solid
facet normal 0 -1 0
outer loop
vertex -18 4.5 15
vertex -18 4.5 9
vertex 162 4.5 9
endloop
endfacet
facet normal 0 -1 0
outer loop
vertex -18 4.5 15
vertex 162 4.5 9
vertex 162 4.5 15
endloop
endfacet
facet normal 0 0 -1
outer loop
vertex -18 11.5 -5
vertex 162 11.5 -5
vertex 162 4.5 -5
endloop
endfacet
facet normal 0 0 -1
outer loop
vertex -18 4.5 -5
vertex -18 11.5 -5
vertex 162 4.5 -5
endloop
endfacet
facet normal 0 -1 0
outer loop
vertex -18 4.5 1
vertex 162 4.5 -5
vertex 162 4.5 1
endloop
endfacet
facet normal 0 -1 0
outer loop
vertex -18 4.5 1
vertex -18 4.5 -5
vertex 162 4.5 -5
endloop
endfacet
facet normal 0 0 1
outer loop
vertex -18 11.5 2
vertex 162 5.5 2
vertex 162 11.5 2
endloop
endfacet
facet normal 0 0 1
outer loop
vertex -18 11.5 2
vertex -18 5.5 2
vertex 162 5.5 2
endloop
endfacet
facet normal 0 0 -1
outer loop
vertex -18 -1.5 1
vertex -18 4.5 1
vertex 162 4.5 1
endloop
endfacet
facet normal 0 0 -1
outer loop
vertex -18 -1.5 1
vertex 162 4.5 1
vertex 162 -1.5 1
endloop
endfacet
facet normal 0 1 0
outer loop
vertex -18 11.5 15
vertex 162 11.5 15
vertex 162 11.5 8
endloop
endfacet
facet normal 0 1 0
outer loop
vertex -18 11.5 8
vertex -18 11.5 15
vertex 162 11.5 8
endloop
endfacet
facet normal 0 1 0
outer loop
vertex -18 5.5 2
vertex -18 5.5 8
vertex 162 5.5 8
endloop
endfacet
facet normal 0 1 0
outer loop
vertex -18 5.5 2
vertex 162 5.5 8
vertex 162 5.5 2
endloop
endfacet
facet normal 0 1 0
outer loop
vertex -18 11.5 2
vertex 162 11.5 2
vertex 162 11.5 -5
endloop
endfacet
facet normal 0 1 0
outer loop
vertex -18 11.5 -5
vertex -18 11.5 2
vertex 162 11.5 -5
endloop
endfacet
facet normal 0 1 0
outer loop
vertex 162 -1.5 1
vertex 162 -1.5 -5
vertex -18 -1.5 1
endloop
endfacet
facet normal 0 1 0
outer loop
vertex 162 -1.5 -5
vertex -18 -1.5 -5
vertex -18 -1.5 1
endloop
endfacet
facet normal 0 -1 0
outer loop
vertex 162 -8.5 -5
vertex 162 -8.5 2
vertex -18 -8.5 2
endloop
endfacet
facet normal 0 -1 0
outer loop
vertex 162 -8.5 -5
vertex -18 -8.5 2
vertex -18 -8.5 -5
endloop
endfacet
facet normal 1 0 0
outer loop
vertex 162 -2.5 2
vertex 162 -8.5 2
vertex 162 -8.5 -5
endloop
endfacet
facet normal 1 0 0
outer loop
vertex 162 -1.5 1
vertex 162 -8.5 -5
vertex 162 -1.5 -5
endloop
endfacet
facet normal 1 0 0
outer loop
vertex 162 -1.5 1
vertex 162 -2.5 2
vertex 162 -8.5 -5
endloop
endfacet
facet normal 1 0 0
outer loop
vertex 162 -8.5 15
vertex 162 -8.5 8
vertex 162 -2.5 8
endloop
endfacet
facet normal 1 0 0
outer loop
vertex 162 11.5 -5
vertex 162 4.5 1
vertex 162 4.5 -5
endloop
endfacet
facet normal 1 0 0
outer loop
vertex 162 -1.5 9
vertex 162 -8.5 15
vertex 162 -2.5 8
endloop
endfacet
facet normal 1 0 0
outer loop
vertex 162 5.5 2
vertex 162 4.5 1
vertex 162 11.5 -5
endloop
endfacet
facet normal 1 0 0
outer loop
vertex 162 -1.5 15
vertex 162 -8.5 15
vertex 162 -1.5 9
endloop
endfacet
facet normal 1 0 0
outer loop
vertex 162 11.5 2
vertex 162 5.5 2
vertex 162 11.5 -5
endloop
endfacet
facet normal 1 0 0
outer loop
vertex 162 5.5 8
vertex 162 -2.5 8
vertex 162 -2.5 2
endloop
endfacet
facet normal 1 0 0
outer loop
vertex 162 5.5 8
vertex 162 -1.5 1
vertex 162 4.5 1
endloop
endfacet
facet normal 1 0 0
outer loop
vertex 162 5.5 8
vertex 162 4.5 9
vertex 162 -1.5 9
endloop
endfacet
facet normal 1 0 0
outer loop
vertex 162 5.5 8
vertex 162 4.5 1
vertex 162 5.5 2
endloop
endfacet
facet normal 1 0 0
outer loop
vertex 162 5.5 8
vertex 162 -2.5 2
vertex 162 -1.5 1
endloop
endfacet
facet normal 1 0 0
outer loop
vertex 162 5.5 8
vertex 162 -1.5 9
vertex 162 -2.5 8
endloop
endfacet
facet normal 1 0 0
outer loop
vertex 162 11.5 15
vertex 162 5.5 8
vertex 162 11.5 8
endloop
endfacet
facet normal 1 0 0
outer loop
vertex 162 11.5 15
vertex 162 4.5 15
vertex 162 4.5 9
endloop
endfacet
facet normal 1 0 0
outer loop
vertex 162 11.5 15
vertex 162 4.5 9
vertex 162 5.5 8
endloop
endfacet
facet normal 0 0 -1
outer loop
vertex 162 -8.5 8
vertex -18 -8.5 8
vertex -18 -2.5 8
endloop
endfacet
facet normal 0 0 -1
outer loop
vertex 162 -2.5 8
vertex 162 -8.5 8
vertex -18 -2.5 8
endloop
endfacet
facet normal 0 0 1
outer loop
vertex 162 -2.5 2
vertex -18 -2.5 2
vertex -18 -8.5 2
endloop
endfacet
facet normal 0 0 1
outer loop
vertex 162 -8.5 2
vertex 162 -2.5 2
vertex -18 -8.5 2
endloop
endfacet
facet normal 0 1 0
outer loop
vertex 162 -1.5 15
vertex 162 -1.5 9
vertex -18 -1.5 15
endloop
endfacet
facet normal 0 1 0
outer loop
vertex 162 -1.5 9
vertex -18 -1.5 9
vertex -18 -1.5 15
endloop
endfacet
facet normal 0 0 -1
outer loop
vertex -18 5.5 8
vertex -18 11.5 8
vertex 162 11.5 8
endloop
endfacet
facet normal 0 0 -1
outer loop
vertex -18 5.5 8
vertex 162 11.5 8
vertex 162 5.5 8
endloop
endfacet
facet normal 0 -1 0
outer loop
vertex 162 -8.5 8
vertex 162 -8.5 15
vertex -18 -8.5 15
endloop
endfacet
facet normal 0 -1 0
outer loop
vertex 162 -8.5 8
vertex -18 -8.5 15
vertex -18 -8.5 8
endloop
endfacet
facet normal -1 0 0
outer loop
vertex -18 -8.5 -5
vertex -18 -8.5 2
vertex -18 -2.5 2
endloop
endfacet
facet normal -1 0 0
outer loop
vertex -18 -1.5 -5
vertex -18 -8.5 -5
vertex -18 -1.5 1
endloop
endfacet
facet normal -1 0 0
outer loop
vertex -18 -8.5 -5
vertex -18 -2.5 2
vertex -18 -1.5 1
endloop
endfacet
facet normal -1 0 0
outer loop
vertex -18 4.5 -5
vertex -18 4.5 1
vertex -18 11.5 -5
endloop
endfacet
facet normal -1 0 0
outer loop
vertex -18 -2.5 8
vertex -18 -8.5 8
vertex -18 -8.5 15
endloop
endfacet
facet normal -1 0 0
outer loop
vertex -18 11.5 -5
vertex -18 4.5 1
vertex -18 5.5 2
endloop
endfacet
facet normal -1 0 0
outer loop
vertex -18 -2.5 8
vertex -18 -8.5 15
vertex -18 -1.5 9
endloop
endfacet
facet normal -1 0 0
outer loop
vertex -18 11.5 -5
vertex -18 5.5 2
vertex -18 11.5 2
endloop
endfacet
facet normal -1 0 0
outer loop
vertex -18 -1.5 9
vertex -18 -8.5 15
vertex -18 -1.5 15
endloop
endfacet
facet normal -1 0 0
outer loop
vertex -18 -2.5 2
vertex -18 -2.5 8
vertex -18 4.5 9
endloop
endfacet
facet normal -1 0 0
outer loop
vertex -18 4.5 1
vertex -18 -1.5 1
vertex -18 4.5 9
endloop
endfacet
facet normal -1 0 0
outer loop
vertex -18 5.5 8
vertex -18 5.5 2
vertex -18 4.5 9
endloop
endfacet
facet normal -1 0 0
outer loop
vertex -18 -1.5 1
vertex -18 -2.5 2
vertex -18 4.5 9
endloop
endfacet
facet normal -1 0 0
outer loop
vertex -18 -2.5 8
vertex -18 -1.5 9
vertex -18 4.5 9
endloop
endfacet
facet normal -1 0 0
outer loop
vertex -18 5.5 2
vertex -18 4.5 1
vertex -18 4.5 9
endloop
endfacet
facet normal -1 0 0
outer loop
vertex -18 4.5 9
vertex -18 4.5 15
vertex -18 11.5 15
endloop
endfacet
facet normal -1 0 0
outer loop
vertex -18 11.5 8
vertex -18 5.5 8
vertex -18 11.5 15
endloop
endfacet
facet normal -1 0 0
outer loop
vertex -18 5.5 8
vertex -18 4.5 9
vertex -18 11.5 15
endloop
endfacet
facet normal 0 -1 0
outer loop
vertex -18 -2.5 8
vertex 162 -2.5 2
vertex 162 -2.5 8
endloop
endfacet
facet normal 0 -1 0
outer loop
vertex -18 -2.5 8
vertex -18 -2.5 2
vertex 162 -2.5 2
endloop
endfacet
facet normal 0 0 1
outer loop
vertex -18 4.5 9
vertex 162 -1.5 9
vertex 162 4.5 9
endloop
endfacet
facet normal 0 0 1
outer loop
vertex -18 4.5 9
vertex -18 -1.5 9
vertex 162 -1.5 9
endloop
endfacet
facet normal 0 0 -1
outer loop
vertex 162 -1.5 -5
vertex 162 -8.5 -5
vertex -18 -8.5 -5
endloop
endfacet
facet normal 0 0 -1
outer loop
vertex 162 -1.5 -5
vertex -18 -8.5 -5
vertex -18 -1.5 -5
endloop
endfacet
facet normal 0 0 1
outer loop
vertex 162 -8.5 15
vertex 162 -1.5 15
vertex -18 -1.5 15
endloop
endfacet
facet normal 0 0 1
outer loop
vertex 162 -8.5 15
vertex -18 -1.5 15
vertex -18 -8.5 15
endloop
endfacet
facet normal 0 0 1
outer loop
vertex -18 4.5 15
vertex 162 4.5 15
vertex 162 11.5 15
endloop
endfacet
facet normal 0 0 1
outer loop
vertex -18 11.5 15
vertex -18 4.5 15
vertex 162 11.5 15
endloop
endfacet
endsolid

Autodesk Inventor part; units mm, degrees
ref_plane "YZ Plane" through (0, 0, 0) normal (1, 0, 0) x (0, 1, 0)
ref_plane "XZ Plane" through (0, 0, 0) normal (0, 1, 0) x (-1, 0, 0)
ref_plane "XY Plane" through (0, 0, 0) normal (0, 0, 1) x (1, 0, 0)
sketch "Sketch1" plane through (0, 0, 0) normal (1, 0, 0) x (0, 1, 0)
  line L0 (-8.5, -445) -> (-8.5, -5) projected
  line L1 (11.5, -5) -> (11.5, -445) projected
  line L2 (-8.5, -5) -> (-1.5, -5)
  line L3 (-1.5, -5) -> (-1.5, 2)
  line L4 (-1.5, 2) -> (-8.5, 2)
  line L5 (-8.5, 2) -> (-8.5, -5)
  line L6 (11.5, -5) -> (4.5, -5)
  line L7 (4.5, -5) -> (4.5, 2)
  line L8 (4.5, 2) -> (11.5, 2)
  line L9 (11.5, 2) -> (11.5, -5)
  line L10 (11.5, 8) -> (4.5, 8)
  line L11 (4.5, 8) -> (4.5, 15)
  line L12 (4.5, 15) -> (11.5, 15)
  line L13 (11.5, 15) -> (11.5, 8)
  line L14 (-8.5, 8) -> (-1.5, 8)
  line L15 (-1.5, 8) -> (-1.5, 15)
  line L16 (-1.5, 15) -> (-8.5, 15)
  line L17 (-8.5, 15) -> (-8.5, 8)
  line L18 (5.5, 1) -> (-2.5, 1)
  line L19 (-2.5, 1) -> (-2.5, 9)
  line L20 (-2.5, 9) -> (5.5, 9)
  line L21 (5.5, 9) -> (5.5, 1)
  point P0 (0, 0)
  point P1 (5.5, 2)
  point P2 (5.5, 8)
  point P3 (4.5, 9)
  point P4 (-1.5, 9)
  point P5 (-2.5, 8)
  point P6 (-2.5, 2)
  point P7 (-1.5, 1)
  point P8 (4.5, 1)
  dimension "d0" = 7
  dimension "d1" = 7
  dimension "d2" = 7
  dimension "d3" = 7
  dimension "d4" = 7
  dimension "d5" = 7
  dimension "d6" = 7
  dimension "d7" = 7
  dimension "d8" = 6
  dimension "d9" = 8
  dimension "d10" = 8
  dimension "d11" = 1
  dimension "d12" = 1
extrude "Extrusion1" add sketch "Sketch1" along normal blind 162 and the other way blind 18
properties part number "ybar"
